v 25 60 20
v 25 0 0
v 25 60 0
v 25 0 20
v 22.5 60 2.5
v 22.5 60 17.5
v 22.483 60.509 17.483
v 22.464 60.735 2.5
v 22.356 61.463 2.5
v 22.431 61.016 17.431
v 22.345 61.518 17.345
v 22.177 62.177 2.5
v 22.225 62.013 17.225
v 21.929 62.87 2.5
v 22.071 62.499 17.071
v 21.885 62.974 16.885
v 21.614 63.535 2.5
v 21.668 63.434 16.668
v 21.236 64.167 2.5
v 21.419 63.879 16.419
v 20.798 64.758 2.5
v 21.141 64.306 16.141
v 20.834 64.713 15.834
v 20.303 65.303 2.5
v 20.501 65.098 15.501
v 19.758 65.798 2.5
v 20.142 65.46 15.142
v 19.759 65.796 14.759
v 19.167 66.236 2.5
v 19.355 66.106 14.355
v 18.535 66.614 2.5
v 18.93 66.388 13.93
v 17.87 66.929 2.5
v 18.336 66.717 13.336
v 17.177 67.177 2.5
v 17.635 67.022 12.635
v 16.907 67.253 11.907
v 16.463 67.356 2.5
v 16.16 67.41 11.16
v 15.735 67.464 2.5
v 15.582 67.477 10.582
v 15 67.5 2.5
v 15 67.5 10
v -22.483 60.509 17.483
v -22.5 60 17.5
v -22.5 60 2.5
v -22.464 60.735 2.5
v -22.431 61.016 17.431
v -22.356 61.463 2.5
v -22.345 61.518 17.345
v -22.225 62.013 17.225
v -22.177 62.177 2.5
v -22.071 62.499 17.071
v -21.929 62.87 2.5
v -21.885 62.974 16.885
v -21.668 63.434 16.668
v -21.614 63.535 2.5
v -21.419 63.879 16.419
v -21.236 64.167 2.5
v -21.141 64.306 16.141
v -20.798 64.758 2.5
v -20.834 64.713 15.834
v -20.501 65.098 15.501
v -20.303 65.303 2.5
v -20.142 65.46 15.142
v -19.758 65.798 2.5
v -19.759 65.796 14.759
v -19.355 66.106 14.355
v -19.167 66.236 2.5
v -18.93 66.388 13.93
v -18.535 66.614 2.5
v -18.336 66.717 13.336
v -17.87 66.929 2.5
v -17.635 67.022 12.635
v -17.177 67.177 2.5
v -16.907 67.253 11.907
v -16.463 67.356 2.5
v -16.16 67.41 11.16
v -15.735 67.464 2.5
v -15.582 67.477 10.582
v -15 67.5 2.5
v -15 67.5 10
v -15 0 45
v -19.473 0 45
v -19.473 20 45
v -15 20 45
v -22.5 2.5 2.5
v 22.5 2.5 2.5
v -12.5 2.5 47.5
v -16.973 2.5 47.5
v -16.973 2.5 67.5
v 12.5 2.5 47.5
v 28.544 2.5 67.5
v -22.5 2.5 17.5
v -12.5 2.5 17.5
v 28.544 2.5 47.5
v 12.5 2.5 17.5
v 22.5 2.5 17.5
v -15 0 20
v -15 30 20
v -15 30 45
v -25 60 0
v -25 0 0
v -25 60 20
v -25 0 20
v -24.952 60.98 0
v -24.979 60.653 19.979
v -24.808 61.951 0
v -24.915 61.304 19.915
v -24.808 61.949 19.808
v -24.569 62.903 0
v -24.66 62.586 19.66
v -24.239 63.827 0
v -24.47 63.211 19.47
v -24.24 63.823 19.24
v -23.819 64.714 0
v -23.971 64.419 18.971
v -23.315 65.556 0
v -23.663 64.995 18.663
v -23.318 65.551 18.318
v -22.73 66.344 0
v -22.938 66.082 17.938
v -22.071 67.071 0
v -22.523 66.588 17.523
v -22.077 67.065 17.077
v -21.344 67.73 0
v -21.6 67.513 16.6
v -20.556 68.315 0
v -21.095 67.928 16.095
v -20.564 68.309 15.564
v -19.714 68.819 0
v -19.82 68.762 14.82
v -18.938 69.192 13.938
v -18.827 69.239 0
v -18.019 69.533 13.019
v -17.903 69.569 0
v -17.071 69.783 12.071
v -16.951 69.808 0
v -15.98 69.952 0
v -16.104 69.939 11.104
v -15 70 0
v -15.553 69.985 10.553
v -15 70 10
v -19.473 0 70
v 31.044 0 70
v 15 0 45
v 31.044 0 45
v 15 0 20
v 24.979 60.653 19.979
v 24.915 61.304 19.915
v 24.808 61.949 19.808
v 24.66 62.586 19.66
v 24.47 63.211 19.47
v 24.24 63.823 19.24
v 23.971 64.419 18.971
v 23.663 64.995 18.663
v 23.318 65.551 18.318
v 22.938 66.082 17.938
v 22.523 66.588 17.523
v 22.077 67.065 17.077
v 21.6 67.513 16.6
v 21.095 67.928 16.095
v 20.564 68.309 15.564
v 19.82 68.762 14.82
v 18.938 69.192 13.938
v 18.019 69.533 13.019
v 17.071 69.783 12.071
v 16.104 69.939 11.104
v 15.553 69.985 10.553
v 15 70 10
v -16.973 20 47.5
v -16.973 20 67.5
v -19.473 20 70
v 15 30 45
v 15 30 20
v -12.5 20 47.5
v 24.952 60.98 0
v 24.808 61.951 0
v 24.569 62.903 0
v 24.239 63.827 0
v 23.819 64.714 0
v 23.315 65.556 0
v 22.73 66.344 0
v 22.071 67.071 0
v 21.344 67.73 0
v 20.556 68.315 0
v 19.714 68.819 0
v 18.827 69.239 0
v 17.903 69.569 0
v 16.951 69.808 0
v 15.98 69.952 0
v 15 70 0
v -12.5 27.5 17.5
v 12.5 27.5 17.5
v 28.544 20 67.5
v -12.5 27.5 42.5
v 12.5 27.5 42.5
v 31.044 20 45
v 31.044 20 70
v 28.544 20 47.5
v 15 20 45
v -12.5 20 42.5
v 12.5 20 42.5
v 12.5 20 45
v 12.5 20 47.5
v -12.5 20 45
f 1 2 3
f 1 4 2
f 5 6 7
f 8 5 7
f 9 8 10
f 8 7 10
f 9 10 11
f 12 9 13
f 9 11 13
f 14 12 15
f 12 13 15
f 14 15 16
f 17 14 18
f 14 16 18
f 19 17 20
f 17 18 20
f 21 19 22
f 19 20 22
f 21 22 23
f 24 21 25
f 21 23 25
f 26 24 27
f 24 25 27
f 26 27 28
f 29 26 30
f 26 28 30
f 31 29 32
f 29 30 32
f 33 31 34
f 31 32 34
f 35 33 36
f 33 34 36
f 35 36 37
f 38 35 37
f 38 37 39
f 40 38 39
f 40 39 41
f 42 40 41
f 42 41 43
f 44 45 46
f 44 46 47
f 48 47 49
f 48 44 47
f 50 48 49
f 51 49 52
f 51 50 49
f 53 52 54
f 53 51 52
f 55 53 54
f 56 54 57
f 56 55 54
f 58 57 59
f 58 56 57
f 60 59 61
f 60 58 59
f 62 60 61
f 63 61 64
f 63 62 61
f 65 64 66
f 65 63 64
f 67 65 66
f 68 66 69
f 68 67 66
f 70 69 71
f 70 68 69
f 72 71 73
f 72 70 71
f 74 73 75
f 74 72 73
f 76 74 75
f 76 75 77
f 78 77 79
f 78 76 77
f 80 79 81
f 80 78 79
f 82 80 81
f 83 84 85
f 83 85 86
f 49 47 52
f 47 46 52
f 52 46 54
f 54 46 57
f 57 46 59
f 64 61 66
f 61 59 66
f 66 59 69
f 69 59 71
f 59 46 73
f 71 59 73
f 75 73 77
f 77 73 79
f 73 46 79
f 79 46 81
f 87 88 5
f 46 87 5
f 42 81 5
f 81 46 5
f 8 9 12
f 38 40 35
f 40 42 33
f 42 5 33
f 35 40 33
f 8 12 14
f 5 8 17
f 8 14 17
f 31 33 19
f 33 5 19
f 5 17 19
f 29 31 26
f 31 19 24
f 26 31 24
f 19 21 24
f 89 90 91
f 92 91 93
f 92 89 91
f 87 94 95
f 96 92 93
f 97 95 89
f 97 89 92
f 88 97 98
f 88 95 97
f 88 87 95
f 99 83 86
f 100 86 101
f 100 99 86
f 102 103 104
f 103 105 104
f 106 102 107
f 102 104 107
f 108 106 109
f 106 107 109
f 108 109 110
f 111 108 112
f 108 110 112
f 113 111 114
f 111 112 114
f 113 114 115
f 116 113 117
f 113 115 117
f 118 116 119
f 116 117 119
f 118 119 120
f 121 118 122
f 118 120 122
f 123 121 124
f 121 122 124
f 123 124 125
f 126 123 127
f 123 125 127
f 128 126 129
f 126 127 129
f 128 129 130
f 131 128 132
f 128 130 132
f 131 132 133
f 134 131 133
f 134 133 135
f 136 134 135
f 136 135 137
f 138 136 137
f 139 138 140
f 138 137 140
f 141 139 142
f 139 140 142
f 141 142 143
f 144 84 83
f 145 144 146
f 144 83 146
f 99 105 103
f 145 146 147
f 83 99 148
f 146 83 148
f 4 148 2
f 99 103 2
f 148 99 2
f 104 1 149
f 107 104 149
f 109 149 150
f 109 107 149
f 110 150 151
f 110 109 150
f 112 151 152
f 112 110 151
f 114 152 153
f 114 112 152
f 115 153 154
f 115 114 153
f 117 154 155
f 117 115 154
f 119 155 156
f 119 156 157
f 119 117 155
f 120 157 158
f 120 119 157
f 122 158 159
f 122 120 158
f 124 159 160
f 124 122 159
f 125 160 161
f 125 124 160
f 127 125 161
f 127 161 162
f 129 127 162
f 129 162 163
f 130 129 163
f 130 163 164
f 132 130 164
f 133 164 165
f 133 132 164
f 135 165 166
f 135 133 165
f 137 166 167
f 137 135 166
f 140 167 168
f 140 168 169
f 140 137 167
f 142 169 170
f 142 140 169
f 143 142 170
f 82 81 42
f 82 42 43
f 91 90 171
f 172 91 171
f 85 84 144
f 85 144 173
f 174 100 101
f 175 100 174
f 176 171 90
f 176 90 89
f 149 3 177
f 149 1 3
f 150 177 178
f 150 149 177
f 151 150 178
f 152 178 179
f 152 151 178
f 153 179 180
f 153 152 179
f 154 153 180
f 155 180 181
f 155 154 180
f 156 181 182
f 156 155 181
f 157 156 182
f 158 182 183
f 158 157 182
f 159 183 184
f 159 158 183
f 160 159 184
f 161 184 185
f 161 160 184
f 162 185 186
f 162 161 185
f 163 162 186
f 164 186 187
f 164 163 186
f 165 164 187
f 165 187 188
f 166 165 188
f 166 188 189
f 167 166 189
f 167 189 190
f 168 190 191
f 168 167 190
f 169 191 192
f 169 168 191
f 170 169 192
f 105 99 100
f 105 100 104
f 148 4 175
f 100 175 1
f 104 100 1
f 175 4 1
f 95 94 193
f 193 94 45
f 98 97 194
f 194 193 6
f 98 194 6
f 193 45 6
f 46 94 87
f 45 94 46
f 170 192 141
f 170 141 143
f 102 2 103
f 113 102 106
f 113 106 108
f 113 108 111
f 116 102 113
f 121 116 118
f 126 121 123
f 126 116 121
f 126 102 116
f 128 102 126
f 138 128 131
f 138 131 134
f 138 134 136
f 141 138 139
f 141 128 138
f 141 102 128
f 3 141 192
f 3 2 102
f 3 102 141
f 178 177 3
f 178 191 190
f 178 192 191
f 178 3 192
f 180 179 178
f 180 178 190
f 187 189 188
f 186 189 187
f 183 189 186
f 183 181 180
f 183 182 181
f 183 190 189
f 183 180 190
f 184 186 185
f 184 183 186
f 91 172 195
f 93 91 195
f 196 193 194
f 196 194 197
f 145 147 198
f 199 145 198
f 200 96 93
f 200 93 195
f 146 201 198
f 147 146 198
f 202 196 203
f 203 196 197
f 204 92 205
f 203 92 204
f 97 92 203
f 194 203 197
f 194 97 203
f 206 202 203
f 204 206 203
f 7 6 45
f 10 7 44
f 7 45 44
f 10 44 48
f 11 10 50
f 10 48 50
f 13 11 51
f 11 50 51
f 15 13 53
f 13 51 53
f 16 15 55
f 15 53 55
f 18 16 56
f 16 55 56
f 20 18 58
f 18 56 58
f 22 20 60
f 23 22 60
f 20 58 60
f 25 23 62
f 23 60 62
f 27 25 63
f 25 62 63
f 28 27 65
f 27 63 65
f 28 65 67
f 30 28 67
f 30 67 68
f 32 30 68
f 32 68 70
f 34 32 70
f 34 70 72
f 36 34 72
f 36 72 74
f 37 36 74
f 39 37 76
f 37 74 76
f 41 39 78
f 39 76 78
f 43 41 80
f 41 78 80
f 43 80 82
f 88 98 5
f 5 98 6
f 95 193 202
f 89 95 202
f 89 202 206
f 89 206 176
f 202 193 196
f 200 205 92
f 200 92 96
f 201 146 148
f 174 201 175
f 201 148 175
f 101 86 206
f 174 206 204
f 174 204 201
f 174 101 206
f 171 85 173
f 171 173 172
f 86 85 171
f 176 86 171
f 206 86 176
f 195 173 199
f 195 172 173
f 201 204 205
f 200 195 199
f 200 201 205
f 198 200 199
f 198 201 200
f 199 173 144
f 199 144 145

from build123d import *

# Parameters (mm, degrees)
F0_W        = 70
F0_H        = 20
F1_DEPTH    = 25
F2_W        = 30
F2_H        = 30
F3_DEPTH    = 25
F4_R        = 10
F5_W        = 50.5173448473
F5_H        = 20
F6_DEPTH    = 25
F7_T        = 2.5
F7_T3_DEPTH = 35
F7_T5_DEPTH = 35
F7_T7_DEPTH = 25


# Not quite as in the source:
# - a shell that OpenCascade refuses in one call is made with other operations: the cavity is built on its own and cut out


with BuildPart() as f1:
    # F0 (on Right) → F1 (new body, symmetric)
    with BuildSketch(Plane.YZ):
        with Locations((35, 10)):
            Rectangle(F0_W, F0_H)
    extrude(amount=F1_DEPTH, both=True)

    # F2 (on face) → F3 (join)
    with BuildSketch(Plane.XY.offset(20)):
        with Locations((0, 15)):
            Rectangle(F2_W, F2_H)
    extrude(amount=F3_DEPTH)

    # F4
    f4_edges = [f1.edges().sort_by_distance(p)[0] for p in [
        (-25, 70, 10),
        (0, 70, 20),
        (25, 70, 10),
    ]]
    fillet(f4_edges, radius=F4_R)

    # F5 (on face) → F6 (join)
    with BuildSketch(Plane.XY.offset(45)):
        with Locations((5.7856766507, 10)):
            Rectangle(F5_W, F5_H)
    extrude(amount=F6_DEPTH)

    # F7: shell of thickness 2.5, made by hand


with BuildPart() as f7_core1:
    # F7_t2: copy of F1
    add(f1.part)

    # the walls: a layer under each face that stays
    f7_faces = [f7_core1.faces().sort_by_distance(p)[0] for p in [
        (-16.6666666667, 50, 20),
        (25, 30, 10),
        (0, 67.0710678119, 17.0710678119),
        (3.0221745372, 0, 35),
        (-25, 30, 10),
        (15, 15, 32.5),
        (0, 30, 32.5),
        (-15, 15, 32.5),
        (22.0710678119, 67.0710678119, 10),
        (0, 35, 0),
        (0, 70, 5),
        (-22.0710678119, 67.0710678119, 10),
        (23.0221745372, 10, 45),
        (0, 25, 45),
        (-17.2364978865, 10, 45),
        (-19.472995773, 10, 57.5),
        (31.0443490744, 10, 57.5),
        (5.7856766507, 10, 70),
    ]]
    thicken(f7_faces, amount=-F7_T, mode=Mode.SUBTRACT)

    # F7_s4 → F7_t3 (cut)
    with BuildSketch(Plane.XZ.offset(-32.5)):
        Polygon((15.025, 20.025), (15, 17.5), (12.5, 17.5), (12.5, 20), align=None)
        Polygon((-15.025, 20.025), (-15, 17.5), (-12.5, 17.5), (-12.5, 20), align=None)
    extrude(amount=F7_T3_DEPTH, mode=Mode.SUBTRACT)

    # F7_s6 → F7_t5 (cut)
    with BuildSketch(Plane.YZ.offset(-17.5)):
        Polygon((30.025, 20.025), (30, 17.5), (27.5, 17.5), (27.5, 20), align=None)
    extrude(amount=F7_T5_DEPTH, mode=Mode.SUBTRACT)

    # F7_s8 → F7_t7 (cut)
    with BuildSketch(Plane.XZ.offset(-22.5)):
        Polygon((15.025, 44.975), (12.5, 45), (12.5, 47.5), (15, 47.5), align=None)
        Polygon((-15.025, 44.975), (-12.5, 45), (-12.5, 47.5), (-15, 47.5), align=None)
    extrude(amount=F7_T7_DEPTH, mode=Mode.SUBTRACT)


with BuildPart() as f1_1:
    add(f1.part)

    # what is left inside the walls is the cavity
    f7_cavity = [f7_core1.part.solids().sort_by_distance(p)[0] for p in [
        (-7.5, 35, 2.525),
    ]]
    add(f7_cavity, mode=Mode.SUBTRACT)


solid = f1_1.part
